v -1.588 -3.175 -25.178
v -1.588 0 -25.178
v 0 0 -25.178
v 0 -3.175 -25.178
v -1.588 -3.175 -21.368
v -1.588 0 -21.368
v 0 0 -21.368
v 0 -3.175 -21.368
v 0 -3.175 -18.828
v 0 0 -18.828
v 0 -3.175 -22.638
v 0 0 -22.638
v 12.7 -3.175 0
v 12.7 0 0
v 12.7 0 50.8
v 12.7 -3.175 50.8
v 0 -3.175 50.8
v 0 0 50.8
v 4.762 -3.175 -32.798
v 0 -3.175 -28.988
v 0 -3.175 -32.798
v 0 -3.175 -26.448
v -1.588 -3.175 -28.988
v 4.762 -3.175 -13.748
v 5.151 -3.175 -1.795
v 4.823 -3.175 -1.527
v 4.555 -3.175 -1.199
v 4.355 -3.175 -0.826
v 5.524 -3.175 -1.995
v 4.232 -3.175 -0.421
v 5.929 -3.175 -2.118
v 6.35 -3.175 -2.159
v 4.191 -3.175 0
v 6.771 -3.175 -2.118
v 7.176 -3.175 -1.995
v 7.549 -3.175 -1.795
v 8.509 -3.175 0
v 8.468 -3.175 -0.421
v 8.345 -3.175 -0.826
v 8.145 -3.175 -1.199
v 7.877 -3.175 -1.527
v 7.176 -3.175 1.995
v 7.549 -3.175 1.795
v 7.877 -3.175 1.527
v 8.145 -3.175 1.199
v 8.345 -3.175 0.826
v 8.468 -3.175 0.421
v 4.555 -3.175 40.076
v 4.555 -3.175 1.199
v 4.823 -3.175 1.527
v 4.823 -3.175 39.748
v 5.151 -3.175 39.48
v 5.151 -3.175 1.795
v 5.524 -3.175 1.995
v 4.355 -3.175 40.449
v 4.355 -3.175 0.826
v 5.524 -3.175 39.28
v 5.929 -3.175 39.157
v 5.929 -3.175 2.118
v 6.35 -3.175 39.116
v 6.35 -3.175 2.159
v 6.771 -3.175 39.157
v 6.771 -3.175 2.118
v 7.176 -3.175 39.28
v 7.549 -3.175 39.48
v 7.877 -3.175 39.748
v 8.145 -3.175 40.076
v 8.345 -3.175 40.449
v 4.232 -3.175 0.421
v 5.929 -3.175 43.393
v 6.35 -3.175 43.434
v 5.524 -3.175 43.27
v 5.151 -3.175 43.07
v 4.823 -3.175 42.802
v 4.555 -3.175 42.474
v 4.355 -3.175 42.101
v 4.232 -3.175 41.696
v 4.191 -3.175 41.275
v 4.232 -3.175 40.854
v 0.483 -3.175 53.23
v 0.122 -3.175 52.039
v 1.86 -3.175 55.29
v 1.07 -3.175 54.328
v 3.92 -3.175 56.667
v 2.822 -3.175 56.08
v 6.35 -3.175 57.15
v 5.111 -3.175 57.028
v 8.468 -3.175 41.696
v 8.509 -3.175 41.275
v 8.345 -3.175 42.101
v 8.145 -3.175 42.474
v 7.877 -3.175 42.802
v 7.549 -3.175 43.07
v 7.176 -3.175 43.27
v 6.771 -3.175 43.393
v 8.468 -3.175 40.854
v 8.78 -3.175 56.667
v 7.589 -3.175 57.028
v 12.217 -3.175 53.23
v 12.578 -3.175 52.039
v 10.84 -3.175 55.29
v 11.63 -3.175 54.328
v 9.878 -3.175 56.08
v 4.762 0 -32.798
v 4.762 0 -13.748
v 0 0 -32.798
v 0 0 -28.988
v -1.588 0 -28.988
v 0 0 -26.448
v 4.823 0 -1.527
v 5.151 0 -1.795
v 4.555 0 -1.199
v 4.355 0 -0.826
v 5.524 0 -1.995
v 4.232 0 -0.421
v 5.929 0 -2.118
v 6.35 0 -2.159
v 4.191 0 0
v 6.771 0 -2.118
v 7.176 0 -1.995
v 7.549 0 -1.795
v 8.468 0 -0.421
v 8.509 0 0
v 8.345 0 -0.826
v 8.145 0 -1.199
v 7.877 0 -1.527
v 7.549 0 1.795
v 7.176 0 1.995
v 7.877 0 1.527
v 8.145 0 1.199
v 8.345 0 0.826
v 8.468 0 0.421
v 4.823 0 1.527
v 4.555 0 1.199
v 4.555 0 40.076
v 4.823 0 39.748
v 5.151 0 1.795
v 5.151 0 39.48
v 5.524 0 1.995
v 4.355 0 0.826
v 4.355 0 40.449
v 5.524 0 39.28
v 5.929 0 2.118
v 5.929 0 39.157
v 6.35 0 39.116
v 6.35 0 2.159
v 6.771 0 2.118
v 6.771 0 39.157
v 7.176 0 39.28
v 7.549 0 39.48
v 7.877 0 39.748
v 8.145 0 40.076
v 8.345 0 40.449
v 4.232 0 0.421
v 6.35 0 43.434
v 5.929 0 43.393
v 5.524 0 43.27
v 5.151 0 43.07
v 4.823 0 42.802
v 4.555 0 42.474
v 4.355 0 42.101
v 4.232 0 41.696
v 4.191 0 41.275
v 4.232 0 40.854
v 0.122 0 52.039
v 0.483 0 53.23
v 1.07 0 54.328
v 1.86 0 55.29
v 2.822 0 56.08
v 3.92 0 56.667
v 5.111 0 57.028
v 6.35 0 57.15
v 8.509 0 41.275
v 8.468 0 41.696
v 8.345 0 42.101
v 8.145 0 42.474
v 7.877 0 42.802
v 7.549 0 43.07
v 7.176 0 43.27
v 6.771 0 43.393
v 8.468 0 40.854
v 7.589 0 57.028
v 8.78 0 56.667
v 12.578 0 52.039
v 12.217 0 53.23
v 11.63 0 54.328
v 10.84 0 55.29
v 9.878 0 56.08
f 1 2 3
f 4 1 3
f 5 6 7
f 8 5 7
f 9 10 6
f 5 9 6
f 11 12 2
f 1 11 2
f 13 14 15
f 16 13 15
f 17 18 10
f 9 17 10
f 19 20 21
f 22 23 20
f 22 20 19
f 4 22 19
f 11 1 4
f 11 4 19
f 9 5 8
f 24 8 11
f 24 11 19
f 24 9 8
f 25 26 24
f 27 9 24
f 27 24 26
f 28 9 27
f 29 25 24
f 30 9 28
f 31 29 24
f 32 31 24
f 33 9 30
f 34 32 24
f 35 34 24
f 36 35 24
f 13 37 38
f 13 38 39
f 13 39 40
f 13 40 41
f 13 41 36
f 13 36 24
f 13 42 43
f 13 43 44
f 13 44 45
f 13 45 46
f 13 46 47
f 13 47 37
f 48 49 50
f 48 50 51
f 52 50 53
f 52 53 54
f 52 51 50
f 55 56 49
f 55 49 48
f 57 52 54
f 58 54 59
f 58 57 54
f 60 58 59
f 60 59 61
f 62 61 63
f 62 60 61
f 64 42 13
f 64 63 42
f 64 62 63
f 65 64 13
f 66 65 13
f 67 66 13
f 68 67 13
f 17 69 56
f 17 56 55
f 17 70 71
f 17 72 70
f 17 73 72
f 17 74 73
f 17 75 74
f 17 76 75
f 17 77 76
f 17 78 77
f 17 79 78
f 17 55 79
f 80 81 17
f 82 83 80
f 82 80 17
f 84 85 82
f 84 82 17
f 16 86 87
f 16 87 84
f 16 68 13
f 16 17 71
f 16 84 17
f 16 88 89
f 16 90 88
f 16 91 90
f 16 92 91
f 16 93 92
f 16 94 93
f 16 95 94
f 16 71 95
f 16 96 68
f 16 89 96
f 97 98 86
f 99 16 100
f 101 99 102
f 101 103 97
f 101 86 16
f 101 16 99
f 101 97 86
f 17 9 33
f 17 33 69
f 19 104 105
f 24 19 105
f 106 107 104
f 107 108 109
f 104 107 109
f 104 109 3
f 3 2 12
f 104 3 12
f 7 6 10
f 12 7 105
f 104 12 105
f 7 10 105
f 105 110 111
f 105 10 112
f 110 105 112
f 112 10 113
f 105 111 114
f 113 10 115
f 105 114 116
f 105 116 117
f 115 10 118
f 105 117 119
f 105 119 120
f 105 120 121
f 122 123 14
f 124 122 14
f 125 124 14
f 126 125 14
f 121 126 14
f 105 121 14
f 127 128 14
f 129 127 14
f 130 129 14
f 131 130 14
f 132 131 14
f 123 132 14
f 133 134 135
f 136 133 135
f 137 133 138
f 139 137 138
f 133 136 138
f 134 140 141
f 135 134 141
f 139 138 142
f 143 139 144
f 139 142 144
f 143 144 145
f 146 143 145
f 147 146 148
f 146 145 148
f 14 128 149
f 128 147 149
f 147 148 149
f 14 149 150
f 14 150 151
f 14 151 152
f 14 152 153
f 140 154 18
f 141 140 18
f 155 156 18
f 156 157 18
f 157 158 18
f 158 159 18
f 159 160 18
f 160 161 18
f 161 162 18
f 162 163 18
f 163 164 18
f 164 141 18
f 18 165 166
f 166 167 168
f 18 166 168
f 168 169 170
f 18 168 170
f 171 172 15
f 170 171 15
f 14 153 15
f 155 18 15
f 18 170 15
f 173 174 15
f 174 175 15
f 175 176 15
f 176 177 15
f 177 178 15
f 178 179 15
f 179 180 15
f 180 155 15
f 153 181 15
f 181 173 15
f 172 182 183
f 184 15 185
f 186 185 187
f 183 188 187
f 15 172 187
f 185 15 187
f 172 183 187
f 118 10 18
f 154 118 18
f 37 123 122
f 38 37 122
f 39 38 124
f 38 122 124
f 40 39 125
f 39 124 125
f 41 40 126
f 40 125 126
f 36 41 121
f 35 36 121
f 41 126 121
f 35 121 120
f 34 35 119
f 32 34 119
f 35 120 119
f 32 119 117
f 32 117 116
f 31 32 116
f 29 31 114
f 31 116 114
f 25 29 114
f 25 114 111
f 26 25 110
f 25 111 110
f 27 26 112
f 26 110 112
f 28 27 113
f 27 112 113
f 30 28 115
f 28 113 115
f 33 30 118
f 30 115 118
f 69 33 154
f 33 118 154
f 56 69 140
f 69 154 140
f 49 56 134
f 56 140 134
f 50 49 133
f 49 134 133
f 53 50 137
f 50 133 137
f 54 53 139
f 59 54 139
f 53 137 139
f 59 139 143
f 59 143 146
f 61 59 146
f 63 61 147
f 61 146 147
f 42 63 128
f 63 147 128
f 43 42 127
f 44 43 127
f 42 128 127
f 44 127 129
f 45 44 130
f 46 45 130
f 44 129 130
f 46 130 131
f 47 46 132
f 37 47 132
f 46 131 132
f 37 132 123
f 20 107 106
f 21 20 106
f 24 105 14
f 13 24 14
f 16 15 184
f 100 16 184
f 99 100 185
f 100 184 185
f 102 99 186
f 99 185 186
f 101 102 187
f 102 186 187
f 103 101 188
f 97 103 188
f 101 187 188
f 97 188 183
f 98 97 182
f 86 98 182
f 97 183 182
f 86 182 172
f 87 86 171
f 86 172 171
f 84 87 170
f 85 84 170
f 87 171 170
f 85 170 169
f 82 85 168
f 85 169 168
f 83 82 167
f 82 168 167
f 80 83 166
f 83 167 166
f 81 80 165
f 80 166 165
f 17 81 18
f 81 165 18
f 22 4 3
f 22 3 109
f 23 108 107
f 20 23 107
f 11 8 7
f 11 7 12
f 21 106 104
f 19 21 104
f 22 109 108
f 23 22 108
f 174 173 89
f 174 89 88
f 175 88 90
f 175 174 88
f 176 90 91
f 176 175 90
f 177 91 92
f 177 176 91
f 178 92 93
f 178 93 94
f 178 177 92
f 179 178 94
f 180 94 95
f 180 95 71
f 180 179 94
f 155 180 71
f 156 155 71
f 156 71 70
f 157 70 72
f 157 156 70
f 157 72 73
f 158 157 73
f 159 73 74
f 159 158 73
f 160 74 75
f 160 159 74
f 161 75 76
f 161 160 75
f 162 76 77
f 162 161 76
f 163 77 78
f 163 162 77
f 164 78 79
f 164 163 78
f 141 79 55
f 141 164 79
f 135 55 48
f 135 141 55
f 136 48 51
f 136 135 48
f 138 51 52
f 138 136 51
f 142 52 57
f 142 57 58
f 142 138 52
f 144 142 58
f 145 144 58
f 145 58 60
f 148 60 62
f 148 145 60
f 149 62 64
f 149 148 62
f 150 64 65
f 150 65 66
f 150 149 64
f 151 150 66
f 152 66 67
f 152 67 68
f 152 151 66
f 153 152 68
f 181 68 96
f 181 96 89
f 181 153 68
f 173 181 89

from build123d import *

# Parameters (mm, degrees)
F0_R     = 2.159
F1_DEPTH = 3.175


with BuildPart() as f1:
    # F0 (on Front) → F1 (new body)
    with BuildSketch(Plane.XZ):
        with BuildLine():
            ThreePointArc((4.191, 0), (6.35, 2.159), (8.509, 0))
            Line((8.509, 0), (12.7, 0))
            Line((12.7, 0), (12.7, 50.8))
            Line((12.7, 50.8), (0, 50.8))
            Line((0, 50.8), (0, 0))
            Line((0, 0), (4.191, 0))
        make_face()
        with Locations((6.35, 41.275)):
            Circle(F0_R, mode=Mode.SUBTRACT)
        with BuildLine():
            Line((12.7, 0), (8.509, 0))
            ThreePointArc((8.509, 0), (6.35, -2.159), (4.191, 0))
            Line((4.191, 0), (0, 0))
            Line((0, 0), (0, -18.828153))
            Line((0, -18.828153), (0, -21.368153))
            Line((0, -21.368153), (0, -22.638153))
            Line((0, -22.638153), (0, -25.178153))
            Line((0, -25.178153), (0, -26.448153))
            Line((0, -26.448153), (0, -28.988153))
            Line((0, -28.988153), (0, -32.798153))
            Line((0, -32.798153), (4.7625, -32.798153))
            Line((4.7625, -32.798153), (4.7625, -13.748153))
            Line((4.7625, -13.748153), (12.7, 0))
        make_face()
        with BuildLine():
            Line((0, 50.8), (12.7, 50.8))
            ThreePointArc((12.7, 50.8), (6.35, 57.15), (0, 50.8))
        make_face()
        Polygon((0, -21.368153), (0, -18.828153), (-1.5875, -21.368153), align=None)
        Polygon((-1.5875, -28.988153), (0, -28.988153), (0, -26.448153), align=None)
        Polygon((0, -25.178153), (0, -22.638153), (-1.5875, -25.178153), align=None)
    extrude(amount=F1_DEPTH)


solid = f1.part
